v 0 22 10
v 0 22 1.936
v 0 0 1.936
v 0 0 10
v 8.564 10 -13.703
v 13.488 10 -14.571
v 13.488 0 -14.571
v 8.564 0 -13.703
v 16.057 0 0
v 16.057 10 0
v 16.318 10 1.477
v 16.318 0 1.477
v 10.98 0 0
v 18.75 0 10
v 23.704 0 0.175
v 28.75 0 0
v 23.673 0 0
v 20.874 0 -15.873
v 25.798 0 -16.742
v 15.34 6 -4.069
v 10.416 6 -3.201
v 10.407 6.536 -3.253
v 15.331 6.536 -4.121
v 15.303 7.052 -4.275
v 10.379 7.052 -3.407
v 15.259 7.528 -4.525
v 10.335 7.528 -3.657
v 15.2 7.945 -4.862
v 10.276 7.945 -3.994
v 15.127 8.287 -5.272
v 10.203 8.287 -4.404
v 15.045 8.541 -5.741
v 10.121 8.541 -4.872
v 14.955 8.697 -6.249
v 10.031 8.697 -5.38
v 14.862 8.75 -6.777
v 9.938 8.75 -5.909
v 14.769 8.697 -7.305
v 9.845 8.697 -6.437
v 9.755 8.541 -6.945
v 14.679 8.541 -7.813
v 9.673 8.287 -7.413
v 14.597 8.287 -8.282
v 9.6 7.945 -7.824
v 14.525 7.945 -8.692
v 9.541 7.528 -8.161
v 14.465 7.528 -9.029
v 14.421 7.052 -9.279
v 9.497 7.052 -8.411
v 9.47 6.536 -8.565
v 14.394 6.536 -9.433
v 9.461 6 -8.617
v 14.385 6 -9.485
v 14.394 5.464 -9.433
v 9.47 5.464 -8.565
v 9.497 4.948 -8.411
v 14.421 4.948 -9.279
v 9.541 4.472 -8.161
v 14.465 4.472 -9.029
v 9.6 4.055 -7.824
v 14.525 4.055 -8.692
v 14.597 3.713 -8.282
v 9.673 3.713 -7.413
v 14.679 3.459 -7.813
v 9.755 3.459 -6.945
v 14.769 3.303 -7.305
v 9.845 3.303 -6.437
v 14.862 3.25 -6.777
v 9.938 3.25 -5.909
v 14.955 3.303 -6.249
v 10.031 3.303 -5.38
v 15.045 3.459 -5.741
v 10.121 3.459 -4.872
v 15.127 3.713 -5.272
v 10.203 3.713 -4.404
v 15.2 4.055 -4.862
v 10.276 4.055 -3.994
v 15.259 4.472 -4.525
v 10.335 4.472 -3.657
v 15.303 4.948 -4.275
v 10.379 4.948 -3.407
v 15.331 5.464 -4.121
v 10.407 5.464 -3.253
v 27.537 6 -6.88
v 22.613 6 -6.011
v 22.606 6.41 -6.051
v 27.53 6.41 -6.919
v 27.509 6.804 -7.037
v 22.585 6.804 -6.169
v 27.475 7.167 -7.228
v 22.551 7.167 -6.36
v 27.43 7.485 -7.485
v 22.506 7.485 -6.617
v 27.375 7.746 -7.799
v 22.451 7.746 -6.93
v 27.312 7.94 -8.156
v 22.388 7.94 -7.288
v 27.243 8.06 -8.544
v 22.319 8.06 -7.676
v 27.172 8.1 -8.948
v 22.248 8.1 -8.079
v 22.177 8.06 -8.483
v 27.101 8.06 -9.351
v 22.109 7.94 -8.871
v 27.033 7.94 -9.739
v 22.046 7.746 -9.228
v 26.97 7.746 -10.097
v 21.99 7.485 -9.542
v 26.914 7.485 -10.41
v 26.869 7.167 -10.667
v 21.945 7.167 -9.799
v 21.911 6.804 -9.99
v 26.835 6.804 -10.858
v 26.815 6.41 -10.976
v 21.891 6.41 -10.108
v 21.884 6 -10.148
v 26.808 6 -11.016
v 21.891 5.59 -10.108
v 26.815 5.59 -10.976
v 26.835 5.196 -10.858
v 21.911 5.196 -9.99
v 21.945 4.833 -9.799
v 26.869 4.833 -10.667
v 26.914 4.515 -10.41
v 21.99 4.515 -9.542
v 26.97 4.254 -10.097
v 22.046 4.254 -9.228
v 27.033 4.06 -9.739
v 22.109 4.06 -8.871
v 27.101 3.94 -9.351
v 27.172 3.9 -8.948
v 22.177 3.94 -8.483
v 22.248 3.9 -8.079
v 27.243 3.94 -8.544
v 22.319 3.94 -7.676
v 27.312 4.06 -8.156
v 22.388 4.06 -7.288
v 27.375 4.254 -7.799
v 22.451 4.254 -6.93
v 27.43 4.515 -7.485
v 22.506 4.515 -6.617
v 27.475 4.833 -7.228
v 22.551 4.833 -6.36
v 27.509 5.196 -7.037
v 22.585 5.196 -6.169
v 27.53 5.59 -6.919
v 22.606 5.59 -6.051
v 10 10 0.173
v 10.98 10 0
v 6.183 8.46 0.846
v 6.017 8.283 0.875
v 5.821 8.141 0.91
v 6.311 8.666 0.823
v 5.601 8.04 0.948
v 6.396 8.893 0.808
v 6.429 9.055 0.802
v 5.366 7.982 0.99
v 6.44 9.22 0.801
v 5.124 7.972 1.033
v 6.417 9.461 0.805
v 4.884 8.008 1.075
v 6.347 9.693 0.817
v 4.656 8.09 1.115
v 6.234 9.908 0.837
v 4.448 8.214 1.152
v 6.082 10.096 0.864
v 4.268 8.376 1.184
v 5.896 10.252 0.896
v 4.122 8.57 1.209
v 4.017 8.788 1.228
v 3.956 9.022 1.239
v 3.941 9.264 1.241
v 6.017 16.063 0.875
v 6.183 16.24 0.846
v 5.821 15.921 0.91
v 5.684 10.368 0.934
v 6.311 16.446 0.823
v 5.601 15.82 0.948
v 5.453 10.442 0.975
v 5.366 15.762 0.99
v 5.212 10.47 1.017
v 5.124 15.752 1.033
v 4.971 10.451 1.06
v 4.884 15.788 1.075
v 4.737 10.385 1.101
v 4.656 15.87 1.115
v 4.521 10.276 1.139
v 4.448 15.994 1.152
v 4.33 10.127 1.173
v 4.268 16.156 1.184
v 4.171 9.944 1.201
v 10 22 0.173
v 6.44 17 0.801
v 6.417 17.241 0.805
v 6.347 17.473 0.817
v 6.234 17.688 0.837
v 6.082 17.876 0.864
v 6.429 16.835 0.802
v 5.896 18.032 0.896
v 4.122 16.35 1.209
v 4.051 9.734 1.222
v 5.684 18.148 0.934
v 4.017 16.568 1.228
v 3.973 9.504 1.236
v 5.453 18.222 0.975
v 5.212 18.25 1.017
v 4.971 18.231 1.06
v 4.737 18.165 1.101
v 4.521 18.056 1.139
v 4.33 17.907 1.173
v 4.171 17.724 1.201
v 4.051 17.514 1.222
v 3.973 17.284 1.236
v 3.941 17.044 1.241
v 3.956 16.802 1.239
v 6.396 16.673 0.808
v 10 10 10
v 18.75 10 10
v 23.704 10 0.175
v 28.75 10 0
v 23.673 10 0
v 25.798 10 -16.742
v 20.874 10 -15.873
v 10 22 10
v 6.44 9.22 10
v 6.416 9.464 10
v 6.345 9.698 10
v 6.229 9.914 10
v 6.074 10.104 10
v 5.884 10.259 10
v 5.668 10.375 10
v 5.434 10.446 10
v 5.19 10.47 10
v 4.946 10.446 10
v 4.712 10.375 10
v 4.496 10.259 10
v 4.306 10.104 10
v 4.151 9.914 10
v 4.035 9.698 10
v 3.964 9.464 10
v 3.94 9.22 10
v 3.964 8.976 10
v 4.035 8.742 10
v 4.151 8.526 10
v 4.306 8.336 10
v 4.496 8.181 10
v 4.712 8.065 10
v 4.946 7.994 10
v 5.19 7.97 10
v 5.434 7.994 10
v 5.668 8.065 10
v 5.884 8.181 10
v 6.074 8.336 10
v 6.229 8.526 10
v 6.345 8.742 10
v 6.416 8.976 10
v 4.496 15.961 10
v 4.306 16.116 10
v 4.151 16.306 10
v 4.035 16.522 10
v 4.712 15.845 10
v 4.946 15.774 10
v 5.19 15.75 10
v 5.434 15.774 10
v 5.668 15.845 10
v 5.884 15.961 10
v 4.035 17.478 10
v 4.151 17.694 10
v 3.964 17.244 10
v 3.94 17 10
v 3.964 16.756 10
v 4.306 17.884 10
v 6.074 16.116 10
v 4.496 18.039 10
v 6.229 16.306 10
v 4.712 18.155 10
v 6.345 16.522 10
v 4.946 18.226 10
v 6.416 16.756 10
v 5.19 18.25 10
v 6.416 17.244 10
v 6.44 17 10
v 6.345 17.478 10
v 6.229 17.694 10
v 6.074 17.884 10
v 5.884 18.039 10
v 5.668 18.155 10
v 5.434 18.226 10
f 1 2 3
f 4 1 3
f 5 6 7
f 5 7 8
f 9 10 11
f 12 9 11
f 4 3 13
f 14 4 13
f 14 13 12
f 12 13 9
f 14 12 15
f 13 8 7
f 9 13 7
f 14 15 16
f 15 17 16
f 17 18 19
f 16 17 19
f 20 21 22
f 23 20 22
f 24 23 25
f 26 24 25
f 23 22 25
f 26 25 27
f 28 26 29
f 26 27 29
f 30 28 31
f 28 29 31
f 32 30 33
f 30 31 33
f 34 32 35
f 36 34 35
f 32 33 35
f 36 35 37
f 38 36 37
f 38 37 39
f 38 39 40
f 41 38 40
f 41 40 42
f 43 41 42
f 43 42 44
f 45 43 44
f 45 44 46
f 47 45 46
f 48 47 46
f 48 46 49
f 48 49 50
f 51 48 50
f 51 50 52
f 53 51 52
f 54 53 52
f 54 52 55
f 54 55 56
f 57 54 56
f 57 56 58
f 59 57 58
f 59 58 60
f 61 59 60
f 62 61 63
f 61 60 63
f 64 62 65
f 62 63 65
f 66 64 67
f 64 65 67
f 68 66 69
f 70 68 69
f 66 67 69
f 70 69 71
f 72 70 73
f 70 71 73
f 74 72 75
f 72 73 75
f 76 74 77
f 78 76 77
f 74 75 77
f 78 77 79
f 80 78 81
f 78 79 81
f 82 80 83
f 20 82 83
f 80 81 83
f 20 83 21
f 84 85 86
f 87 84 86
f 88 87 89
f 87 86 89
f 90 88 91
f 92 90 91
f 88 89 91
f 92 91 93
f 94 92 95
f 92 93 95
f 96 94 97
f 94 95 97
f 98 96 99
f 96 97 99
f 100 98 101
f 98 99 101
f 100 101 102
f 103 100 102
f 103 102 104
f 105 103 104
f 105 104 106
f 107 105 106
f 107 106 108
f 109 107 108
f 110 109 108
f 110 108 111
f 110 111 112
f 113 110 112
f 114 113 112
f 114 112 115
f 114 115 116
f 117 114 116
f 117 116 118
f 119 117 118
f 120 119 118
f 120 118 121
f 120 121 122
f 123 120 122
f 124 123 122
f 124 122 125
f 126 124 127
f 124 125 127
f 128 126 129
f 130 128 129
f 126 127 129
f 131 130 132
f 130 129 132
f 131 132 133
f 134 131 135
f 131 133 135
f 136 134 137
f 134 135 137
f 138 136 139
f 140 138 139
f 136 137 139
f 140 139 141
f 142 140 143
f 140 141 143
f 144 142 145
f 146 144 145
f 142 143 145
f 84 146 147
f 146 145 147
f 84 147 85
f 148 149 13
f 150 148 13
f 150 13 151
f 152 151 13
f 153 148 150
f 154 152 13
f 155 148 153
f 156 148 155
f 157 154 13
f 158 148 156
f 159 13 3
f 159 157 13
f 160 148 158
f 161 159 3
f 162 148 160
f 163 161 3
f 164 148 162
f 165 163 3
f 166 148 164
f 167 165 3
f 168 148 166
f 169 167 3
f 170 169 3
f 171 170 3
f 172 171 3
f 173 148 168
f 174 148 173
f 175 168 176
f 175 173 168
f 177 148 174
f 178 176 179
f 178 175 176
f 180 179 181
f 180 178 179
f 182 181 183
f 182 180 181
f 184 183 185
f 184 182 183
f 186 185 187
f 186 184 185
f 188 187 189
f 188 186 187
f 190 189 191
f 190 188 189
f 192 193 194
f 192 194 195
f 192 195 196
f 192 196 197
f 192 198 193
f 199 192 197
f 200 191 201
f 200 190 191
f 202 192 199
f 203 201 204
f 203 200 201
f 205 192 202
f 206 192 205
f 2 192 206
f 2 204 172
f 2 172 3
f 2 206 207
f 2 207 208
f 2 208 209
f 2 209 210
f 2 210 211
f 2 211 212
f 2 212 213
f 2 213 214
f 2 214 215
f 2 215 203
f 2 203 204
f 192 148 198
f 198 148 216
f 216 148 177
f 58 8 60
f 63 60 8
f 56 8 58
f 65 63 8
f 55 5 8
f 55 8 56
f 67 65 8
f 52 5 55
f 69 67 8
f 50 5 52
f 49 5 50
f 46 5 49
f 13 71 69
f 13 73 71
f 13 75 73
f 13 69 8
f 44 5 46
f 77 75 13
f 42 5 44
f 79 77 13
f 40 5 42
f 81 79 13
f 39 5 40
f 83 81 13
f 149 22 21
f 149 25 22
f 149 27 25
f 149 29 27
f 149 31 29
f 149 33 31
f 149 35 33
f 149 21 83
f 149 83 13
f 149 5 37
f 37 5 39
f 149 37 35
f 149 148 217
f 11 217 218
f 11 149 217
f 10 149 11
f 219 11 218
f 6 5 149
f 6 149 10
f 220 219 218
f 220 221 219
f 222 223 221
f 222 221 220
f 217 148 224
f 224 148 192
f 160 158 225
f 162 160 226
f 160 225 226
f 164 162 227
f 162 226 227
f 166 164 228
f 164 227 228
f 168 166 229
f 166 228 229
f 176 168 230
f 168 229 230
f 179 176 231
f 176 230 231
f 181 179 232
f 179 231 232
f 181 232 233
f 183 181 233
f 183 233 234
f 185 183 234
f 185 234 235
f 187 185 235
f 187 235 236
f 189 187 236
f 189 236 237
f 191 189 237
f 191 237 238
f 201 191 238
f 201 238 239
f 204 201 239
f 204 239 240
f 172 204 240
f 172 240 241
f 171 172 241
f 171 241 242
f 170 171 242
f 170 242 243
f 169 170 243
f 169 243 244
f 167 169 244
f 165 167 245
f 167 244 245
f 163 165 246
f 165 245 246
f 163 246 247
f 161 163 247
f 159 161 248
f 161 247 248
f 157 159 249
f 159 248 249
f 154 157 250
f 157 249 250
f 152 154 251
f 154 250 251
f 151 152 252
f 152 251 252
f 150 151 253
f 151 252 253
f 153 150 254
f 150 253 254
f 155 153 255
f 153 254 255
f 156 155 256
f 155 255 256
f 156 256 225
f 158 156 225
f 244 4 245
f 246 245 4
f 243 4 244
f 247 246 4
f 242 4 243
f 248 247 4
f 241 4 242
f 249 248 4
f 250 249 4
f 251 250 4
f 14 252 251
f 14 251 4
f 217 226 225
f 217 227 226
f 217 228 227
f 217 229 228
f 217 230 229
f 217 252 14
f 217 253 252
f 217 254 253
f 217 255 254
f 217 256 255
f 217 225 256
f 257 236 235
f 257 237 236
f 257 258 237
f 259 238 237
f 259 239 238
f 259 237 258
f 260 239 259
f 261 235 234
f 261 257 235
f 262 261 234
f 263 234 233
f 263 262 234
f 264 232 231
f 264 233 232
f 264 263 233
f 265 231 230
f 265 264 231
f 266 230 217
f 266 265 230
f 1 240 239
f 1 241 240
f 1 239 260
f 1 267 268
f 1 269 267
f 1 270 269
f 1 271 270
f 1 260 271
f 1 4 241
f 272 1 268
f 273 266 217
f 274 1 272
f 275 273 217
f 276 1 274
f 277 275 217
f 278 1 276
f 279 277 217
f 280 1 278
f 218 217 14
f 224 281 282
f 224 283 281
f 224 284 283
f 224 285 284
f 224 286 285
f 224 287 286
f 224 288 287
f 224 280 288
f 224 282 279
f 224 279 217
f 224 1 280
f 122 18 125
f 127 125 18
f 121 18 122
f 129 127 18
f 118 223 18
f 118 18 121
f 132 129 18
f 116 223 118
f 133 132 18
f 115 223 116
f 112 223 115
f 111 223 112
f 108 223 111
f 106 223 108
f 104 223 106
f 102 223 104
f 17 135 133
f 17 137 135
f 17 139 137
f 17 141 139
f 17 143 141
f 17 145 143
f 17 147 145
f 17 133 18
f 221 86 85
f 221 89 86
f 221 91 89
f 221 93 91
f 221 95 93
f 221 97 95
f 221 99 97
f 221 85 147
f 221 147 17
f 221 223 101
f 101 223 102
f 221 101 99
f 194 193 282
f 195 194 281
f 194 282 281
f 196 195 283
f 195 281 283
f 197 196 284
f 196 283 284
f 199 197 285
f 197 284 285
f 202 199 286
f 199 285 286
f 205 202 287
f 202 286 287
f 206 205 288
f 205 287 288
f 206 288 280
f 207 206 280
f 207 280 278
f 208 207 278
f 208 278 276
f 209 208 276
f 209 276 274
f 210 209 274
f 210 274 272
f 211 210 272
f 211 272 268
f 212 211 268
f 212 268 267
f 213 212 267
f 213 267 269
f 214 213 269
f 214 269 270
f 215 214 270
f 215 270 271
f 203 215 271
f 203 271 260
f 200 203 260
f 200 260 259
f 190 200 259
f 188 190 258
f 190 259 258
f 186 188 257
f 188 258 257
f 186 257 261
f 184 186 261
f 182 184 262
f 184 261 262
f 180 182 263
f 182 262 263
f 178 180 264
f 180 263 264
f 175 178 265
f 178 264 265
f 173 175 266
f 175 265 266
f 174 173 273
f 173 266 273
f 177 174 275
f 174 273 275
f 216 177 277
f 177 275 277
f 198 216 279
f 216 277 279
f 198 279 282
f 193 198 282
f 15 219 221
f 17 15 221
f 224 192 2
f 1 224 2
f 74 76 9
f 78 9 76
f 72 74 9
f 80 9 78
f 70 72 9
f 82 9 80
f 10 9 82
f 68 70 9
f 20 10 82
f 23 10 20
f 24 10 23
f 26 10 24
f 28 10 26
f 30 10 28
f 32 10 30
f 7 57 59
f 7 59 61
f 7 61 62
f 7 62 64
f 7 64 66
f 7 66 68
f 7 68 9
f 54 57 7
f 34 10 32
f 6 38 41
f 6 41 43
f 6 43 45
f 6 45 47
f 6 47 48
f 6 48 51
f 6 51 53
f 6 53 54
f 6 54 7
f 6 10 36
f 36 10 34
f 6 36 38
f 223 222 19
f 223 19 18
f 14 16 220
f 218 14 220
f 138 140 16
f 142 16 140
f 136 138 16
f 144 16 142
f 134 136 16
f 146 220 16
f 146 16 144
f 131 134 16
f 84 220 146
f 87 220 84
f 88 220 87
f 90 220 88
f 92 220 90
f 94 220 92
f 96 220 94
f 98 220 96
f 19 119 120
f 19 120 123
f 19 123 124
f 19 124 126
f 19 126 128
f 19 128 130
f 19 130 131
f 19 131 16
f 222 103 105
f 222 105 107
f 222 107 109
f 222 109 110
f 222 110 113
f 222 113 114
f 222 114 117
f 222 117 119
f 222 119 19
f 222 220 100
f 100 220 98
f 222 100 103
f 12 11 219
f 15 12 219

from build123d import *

# Parameters (mm, degrees)
BOSS_EXTRU_1_DEPTH      = 10
BOSS_EXTRU_2_DEPTH      = 10
ENL_V_MAT_EXTRU_1_REACH = 37.367
ENL_V_MAT_EXTRU_2_REACH = 34.134
ESQUISSE4_R             = 2.75
ENL_V_MAT_EXTRU_3_REACH = 36.763
ESQUISSE5_R             = 2.1
CHANFREIN1_SIZE         = 10
ENL_V_MAT_EXTRU_4_REACH = 41.885
ENL_V_MAT_EXTRU_5_REACH = 47.008
ESQUISSE7_R             = 1.25


with BuildPart() as part:
    # Esquisse1 → Boss.-Extru.1 (new body)
    with BuildSketch(Plane.XY):
        Polygon((0, 0), (28.75, 0), (28.75, 10), (10, 10), (10, 22), (0, 22), align=None)
    extrude(amount=BOSS_EXTRU_1_DEPTH)

    # Esquisse2 → Boss.-Extru.2 (add)
    with BuildSketch(Plane(origin=(0, 10, 0), x_dir=(1, 0, 0), z_dir=(0, 1, 0))):
        Polygon((28.75, 0), (25.79798098, 16.741731801), (20.873942215, 15.873490913), (23.672866941, 0), align=None)
        Polygon((16.057167351, 0), (13.487884067, 14.57112958), (8.563845302, 13.702888692), (10.980034292, 0), align=None)
    extrude(amount=-BOSS_EXTRU_2_DEPTH)

    # Esquisse3 → Enlèv. mat.-Extru.1 (cut, up to next)
    with BuildSketch(Plane(origin=(0, 10, 0), x_dir=(1, 0, 0), z_dir=(0, 1, 0)), mode=Mode.PRIVATE) as enl_v_mat_extru_1_sk1:
        Polygon((16.057167351, 0), (16.317639618, -1.47721163), (23.703697766, -0.174850297), (23.672866941, 0), align=None)
    enl_v_mat_extru_1_tool1 = extrude(enl_v_mat_extru_1_sk1.sketch, amount=-ENL_V_MAT_EXTRU_1_REACH, mode=Mode.PRIVATE) & part.part
    add(enl_v_mat_extru_1_tool1.solids().sort_by_distance((18.952321, 10, 0.498572))[0], mode=Mode.SUBTRACT)

    # Esquisse4 → Enlèv. mat.-Extru.2 (cut, up to next)
    with BuildSketch(Plane(origin=(10.648945746, 0, -1.877696451), x_dir=(0.1736481776669311, 0, 0.9848077530122079), z_dir=(-0.9848077530122079, 0, 0.1736481776669311)), mode=Mode.PRIVATE) as enl_v_mat_extru_2_sk1:
        with Locations((-4.093337054, 6)):
            Circle(ESQUISSE4_R)
    enl_v_mat_extru_2_tool1 = extrude(enl_v_mat_extru_2_sk1.sketch, amount=-ENL_V_MAT_EXTRU_2_REACH, mode=Mode.PRIVATE) & part.part
    add(enl_v_mat_extru_2_tool1.solids().sort_by_distance((9.938145, 6, -5.908847))[0], mode=Mode.SUBTRACT)

    # Esquisse5 → Enlèv. mat.-Extru.3 (cut, up to next)
    with BuildSketch(Plane(origin=(22.959042659, 0, -4.048298672), x_dir=(0.1736481776669306, 0, 0.9848077530122081), z_dir=(-0.9848077530122081, 0, 0.1736481776669306)), mode=Mode.PRIVATE) as enl_v_mat_extru_3_sk1:
        with Locations((-4.093337054, 6)):
            Circle(ESQUISSE5_R)
    enl_v_mat_extru_3_tool1 = extrude(enl_v_mat_extru_3_sk1.sketch, amount=-ENL_V_MAT_EXTRU_3_REACH, mode=Mode.PRIVATE) & part.part
    add(enl_v_mat_extru_3_tool1.solids().sort_by_distance((22.248242, 6, -8.079449))[0], mode=Mode.SUBTRACT)

    # Chanfrein1
    chanfrein1_edges = [part.edges().sort_by_distance(p)[0] for p in [
        (28.75, 5, 10),
    ]]
    chamfer(chanfrein1_edges, length=CHANFREIN1_SIZE - 0.0001)  # a hair under: the kernel refuses the full size

    # Esquisse6 → Enlèv. mat.-Extru.4 (cut, up to next)
    with BuildSketch(Plane(origin=(0, 22, 0), x_dir=(1, 0, 0), z_dir=(0, 1, 0)), mode=Mode.PRIVATE) as enl_v_mat_extru_4_sk1:
        Polygon((0, 0), (10.980034292, 0), (0, -1.936076295), align=None)
    enl_v_mat_extru_4_tool1 = extrude(enl_v_mat_extru_4_sk1.sketch, amount=-ENL_V_MAT_EXTRU_4_REACH, mode=Mode.PRIVATE) & part.part
    add(enl_v_mat_extru_4_tool1.solids().sort_by_distance((3.660011, 22, 0.645359))[0], mode=Mode.SUBTRACT)

    # Enlèv. mat.-Extru.5: up to this plane
    enl_v_mat_extru_5_end = Plane(origin=(10.980034292, -0.001, 0), z_dir=(0.17364817766693136, 0, 0.9848077530122079))
    # Esquisse7 → Enlèv. mat.-Extru.5 (cut, up to the surface)
    with BuildSketch(Plane.XY.offset(10), mode=Mode.PRIVATE) as enl_v_mat_extru_5_sk1:
        with Locations((5.19, 17)):
            Circle(ESQUISSE7_R)
    enl_v_mat_extru_5_tool1 = split(extrude(enl_v_mat_extru_5_sk1.sketch, amount=-ENL_V_MAT_EXTRU_5_REACH, mode=Mode.PRIVATE), bisect_by=enl_v_mat_extru_5_end, keep=Keep.BOTH, mode=Mode.PRIVATE)
    add(enl_v_mat_extru_5_tool1.solids().sort_by_distance((5.19, 17, 10))[0], mode=Mode.SUBTRACT)
    # Esquisse7 → Enlèv. mat.-Extru.5 (cut, up to the surface)
    with BuildSketch(Plane.XY.offset(10), mode=Mode.PRIVATE) as enl_v_mat_extru_5_sk2:
        with Locations((5.19, 9.22)):
            Circle(ESQUISSE7_R)
    enl_v_mat_extru_5_tool2 = split(extrude(enl_v_mat_extru_5_sk2.sketch, amount=-ENL_V_MAT_EXTRU_5_REACH, mode=Mode.PRIVATE), bisect_by=enl_v_mat_extru_5_end, keep=Keep.BOTH, mode=Mode.PRIVATE)
    add(enl_v_mat_extru_5_tool2.solids().sort_by_distance((5.19, 9.22, 10))[0], mode=Mode.SUBTRACT)


solid = part.part
